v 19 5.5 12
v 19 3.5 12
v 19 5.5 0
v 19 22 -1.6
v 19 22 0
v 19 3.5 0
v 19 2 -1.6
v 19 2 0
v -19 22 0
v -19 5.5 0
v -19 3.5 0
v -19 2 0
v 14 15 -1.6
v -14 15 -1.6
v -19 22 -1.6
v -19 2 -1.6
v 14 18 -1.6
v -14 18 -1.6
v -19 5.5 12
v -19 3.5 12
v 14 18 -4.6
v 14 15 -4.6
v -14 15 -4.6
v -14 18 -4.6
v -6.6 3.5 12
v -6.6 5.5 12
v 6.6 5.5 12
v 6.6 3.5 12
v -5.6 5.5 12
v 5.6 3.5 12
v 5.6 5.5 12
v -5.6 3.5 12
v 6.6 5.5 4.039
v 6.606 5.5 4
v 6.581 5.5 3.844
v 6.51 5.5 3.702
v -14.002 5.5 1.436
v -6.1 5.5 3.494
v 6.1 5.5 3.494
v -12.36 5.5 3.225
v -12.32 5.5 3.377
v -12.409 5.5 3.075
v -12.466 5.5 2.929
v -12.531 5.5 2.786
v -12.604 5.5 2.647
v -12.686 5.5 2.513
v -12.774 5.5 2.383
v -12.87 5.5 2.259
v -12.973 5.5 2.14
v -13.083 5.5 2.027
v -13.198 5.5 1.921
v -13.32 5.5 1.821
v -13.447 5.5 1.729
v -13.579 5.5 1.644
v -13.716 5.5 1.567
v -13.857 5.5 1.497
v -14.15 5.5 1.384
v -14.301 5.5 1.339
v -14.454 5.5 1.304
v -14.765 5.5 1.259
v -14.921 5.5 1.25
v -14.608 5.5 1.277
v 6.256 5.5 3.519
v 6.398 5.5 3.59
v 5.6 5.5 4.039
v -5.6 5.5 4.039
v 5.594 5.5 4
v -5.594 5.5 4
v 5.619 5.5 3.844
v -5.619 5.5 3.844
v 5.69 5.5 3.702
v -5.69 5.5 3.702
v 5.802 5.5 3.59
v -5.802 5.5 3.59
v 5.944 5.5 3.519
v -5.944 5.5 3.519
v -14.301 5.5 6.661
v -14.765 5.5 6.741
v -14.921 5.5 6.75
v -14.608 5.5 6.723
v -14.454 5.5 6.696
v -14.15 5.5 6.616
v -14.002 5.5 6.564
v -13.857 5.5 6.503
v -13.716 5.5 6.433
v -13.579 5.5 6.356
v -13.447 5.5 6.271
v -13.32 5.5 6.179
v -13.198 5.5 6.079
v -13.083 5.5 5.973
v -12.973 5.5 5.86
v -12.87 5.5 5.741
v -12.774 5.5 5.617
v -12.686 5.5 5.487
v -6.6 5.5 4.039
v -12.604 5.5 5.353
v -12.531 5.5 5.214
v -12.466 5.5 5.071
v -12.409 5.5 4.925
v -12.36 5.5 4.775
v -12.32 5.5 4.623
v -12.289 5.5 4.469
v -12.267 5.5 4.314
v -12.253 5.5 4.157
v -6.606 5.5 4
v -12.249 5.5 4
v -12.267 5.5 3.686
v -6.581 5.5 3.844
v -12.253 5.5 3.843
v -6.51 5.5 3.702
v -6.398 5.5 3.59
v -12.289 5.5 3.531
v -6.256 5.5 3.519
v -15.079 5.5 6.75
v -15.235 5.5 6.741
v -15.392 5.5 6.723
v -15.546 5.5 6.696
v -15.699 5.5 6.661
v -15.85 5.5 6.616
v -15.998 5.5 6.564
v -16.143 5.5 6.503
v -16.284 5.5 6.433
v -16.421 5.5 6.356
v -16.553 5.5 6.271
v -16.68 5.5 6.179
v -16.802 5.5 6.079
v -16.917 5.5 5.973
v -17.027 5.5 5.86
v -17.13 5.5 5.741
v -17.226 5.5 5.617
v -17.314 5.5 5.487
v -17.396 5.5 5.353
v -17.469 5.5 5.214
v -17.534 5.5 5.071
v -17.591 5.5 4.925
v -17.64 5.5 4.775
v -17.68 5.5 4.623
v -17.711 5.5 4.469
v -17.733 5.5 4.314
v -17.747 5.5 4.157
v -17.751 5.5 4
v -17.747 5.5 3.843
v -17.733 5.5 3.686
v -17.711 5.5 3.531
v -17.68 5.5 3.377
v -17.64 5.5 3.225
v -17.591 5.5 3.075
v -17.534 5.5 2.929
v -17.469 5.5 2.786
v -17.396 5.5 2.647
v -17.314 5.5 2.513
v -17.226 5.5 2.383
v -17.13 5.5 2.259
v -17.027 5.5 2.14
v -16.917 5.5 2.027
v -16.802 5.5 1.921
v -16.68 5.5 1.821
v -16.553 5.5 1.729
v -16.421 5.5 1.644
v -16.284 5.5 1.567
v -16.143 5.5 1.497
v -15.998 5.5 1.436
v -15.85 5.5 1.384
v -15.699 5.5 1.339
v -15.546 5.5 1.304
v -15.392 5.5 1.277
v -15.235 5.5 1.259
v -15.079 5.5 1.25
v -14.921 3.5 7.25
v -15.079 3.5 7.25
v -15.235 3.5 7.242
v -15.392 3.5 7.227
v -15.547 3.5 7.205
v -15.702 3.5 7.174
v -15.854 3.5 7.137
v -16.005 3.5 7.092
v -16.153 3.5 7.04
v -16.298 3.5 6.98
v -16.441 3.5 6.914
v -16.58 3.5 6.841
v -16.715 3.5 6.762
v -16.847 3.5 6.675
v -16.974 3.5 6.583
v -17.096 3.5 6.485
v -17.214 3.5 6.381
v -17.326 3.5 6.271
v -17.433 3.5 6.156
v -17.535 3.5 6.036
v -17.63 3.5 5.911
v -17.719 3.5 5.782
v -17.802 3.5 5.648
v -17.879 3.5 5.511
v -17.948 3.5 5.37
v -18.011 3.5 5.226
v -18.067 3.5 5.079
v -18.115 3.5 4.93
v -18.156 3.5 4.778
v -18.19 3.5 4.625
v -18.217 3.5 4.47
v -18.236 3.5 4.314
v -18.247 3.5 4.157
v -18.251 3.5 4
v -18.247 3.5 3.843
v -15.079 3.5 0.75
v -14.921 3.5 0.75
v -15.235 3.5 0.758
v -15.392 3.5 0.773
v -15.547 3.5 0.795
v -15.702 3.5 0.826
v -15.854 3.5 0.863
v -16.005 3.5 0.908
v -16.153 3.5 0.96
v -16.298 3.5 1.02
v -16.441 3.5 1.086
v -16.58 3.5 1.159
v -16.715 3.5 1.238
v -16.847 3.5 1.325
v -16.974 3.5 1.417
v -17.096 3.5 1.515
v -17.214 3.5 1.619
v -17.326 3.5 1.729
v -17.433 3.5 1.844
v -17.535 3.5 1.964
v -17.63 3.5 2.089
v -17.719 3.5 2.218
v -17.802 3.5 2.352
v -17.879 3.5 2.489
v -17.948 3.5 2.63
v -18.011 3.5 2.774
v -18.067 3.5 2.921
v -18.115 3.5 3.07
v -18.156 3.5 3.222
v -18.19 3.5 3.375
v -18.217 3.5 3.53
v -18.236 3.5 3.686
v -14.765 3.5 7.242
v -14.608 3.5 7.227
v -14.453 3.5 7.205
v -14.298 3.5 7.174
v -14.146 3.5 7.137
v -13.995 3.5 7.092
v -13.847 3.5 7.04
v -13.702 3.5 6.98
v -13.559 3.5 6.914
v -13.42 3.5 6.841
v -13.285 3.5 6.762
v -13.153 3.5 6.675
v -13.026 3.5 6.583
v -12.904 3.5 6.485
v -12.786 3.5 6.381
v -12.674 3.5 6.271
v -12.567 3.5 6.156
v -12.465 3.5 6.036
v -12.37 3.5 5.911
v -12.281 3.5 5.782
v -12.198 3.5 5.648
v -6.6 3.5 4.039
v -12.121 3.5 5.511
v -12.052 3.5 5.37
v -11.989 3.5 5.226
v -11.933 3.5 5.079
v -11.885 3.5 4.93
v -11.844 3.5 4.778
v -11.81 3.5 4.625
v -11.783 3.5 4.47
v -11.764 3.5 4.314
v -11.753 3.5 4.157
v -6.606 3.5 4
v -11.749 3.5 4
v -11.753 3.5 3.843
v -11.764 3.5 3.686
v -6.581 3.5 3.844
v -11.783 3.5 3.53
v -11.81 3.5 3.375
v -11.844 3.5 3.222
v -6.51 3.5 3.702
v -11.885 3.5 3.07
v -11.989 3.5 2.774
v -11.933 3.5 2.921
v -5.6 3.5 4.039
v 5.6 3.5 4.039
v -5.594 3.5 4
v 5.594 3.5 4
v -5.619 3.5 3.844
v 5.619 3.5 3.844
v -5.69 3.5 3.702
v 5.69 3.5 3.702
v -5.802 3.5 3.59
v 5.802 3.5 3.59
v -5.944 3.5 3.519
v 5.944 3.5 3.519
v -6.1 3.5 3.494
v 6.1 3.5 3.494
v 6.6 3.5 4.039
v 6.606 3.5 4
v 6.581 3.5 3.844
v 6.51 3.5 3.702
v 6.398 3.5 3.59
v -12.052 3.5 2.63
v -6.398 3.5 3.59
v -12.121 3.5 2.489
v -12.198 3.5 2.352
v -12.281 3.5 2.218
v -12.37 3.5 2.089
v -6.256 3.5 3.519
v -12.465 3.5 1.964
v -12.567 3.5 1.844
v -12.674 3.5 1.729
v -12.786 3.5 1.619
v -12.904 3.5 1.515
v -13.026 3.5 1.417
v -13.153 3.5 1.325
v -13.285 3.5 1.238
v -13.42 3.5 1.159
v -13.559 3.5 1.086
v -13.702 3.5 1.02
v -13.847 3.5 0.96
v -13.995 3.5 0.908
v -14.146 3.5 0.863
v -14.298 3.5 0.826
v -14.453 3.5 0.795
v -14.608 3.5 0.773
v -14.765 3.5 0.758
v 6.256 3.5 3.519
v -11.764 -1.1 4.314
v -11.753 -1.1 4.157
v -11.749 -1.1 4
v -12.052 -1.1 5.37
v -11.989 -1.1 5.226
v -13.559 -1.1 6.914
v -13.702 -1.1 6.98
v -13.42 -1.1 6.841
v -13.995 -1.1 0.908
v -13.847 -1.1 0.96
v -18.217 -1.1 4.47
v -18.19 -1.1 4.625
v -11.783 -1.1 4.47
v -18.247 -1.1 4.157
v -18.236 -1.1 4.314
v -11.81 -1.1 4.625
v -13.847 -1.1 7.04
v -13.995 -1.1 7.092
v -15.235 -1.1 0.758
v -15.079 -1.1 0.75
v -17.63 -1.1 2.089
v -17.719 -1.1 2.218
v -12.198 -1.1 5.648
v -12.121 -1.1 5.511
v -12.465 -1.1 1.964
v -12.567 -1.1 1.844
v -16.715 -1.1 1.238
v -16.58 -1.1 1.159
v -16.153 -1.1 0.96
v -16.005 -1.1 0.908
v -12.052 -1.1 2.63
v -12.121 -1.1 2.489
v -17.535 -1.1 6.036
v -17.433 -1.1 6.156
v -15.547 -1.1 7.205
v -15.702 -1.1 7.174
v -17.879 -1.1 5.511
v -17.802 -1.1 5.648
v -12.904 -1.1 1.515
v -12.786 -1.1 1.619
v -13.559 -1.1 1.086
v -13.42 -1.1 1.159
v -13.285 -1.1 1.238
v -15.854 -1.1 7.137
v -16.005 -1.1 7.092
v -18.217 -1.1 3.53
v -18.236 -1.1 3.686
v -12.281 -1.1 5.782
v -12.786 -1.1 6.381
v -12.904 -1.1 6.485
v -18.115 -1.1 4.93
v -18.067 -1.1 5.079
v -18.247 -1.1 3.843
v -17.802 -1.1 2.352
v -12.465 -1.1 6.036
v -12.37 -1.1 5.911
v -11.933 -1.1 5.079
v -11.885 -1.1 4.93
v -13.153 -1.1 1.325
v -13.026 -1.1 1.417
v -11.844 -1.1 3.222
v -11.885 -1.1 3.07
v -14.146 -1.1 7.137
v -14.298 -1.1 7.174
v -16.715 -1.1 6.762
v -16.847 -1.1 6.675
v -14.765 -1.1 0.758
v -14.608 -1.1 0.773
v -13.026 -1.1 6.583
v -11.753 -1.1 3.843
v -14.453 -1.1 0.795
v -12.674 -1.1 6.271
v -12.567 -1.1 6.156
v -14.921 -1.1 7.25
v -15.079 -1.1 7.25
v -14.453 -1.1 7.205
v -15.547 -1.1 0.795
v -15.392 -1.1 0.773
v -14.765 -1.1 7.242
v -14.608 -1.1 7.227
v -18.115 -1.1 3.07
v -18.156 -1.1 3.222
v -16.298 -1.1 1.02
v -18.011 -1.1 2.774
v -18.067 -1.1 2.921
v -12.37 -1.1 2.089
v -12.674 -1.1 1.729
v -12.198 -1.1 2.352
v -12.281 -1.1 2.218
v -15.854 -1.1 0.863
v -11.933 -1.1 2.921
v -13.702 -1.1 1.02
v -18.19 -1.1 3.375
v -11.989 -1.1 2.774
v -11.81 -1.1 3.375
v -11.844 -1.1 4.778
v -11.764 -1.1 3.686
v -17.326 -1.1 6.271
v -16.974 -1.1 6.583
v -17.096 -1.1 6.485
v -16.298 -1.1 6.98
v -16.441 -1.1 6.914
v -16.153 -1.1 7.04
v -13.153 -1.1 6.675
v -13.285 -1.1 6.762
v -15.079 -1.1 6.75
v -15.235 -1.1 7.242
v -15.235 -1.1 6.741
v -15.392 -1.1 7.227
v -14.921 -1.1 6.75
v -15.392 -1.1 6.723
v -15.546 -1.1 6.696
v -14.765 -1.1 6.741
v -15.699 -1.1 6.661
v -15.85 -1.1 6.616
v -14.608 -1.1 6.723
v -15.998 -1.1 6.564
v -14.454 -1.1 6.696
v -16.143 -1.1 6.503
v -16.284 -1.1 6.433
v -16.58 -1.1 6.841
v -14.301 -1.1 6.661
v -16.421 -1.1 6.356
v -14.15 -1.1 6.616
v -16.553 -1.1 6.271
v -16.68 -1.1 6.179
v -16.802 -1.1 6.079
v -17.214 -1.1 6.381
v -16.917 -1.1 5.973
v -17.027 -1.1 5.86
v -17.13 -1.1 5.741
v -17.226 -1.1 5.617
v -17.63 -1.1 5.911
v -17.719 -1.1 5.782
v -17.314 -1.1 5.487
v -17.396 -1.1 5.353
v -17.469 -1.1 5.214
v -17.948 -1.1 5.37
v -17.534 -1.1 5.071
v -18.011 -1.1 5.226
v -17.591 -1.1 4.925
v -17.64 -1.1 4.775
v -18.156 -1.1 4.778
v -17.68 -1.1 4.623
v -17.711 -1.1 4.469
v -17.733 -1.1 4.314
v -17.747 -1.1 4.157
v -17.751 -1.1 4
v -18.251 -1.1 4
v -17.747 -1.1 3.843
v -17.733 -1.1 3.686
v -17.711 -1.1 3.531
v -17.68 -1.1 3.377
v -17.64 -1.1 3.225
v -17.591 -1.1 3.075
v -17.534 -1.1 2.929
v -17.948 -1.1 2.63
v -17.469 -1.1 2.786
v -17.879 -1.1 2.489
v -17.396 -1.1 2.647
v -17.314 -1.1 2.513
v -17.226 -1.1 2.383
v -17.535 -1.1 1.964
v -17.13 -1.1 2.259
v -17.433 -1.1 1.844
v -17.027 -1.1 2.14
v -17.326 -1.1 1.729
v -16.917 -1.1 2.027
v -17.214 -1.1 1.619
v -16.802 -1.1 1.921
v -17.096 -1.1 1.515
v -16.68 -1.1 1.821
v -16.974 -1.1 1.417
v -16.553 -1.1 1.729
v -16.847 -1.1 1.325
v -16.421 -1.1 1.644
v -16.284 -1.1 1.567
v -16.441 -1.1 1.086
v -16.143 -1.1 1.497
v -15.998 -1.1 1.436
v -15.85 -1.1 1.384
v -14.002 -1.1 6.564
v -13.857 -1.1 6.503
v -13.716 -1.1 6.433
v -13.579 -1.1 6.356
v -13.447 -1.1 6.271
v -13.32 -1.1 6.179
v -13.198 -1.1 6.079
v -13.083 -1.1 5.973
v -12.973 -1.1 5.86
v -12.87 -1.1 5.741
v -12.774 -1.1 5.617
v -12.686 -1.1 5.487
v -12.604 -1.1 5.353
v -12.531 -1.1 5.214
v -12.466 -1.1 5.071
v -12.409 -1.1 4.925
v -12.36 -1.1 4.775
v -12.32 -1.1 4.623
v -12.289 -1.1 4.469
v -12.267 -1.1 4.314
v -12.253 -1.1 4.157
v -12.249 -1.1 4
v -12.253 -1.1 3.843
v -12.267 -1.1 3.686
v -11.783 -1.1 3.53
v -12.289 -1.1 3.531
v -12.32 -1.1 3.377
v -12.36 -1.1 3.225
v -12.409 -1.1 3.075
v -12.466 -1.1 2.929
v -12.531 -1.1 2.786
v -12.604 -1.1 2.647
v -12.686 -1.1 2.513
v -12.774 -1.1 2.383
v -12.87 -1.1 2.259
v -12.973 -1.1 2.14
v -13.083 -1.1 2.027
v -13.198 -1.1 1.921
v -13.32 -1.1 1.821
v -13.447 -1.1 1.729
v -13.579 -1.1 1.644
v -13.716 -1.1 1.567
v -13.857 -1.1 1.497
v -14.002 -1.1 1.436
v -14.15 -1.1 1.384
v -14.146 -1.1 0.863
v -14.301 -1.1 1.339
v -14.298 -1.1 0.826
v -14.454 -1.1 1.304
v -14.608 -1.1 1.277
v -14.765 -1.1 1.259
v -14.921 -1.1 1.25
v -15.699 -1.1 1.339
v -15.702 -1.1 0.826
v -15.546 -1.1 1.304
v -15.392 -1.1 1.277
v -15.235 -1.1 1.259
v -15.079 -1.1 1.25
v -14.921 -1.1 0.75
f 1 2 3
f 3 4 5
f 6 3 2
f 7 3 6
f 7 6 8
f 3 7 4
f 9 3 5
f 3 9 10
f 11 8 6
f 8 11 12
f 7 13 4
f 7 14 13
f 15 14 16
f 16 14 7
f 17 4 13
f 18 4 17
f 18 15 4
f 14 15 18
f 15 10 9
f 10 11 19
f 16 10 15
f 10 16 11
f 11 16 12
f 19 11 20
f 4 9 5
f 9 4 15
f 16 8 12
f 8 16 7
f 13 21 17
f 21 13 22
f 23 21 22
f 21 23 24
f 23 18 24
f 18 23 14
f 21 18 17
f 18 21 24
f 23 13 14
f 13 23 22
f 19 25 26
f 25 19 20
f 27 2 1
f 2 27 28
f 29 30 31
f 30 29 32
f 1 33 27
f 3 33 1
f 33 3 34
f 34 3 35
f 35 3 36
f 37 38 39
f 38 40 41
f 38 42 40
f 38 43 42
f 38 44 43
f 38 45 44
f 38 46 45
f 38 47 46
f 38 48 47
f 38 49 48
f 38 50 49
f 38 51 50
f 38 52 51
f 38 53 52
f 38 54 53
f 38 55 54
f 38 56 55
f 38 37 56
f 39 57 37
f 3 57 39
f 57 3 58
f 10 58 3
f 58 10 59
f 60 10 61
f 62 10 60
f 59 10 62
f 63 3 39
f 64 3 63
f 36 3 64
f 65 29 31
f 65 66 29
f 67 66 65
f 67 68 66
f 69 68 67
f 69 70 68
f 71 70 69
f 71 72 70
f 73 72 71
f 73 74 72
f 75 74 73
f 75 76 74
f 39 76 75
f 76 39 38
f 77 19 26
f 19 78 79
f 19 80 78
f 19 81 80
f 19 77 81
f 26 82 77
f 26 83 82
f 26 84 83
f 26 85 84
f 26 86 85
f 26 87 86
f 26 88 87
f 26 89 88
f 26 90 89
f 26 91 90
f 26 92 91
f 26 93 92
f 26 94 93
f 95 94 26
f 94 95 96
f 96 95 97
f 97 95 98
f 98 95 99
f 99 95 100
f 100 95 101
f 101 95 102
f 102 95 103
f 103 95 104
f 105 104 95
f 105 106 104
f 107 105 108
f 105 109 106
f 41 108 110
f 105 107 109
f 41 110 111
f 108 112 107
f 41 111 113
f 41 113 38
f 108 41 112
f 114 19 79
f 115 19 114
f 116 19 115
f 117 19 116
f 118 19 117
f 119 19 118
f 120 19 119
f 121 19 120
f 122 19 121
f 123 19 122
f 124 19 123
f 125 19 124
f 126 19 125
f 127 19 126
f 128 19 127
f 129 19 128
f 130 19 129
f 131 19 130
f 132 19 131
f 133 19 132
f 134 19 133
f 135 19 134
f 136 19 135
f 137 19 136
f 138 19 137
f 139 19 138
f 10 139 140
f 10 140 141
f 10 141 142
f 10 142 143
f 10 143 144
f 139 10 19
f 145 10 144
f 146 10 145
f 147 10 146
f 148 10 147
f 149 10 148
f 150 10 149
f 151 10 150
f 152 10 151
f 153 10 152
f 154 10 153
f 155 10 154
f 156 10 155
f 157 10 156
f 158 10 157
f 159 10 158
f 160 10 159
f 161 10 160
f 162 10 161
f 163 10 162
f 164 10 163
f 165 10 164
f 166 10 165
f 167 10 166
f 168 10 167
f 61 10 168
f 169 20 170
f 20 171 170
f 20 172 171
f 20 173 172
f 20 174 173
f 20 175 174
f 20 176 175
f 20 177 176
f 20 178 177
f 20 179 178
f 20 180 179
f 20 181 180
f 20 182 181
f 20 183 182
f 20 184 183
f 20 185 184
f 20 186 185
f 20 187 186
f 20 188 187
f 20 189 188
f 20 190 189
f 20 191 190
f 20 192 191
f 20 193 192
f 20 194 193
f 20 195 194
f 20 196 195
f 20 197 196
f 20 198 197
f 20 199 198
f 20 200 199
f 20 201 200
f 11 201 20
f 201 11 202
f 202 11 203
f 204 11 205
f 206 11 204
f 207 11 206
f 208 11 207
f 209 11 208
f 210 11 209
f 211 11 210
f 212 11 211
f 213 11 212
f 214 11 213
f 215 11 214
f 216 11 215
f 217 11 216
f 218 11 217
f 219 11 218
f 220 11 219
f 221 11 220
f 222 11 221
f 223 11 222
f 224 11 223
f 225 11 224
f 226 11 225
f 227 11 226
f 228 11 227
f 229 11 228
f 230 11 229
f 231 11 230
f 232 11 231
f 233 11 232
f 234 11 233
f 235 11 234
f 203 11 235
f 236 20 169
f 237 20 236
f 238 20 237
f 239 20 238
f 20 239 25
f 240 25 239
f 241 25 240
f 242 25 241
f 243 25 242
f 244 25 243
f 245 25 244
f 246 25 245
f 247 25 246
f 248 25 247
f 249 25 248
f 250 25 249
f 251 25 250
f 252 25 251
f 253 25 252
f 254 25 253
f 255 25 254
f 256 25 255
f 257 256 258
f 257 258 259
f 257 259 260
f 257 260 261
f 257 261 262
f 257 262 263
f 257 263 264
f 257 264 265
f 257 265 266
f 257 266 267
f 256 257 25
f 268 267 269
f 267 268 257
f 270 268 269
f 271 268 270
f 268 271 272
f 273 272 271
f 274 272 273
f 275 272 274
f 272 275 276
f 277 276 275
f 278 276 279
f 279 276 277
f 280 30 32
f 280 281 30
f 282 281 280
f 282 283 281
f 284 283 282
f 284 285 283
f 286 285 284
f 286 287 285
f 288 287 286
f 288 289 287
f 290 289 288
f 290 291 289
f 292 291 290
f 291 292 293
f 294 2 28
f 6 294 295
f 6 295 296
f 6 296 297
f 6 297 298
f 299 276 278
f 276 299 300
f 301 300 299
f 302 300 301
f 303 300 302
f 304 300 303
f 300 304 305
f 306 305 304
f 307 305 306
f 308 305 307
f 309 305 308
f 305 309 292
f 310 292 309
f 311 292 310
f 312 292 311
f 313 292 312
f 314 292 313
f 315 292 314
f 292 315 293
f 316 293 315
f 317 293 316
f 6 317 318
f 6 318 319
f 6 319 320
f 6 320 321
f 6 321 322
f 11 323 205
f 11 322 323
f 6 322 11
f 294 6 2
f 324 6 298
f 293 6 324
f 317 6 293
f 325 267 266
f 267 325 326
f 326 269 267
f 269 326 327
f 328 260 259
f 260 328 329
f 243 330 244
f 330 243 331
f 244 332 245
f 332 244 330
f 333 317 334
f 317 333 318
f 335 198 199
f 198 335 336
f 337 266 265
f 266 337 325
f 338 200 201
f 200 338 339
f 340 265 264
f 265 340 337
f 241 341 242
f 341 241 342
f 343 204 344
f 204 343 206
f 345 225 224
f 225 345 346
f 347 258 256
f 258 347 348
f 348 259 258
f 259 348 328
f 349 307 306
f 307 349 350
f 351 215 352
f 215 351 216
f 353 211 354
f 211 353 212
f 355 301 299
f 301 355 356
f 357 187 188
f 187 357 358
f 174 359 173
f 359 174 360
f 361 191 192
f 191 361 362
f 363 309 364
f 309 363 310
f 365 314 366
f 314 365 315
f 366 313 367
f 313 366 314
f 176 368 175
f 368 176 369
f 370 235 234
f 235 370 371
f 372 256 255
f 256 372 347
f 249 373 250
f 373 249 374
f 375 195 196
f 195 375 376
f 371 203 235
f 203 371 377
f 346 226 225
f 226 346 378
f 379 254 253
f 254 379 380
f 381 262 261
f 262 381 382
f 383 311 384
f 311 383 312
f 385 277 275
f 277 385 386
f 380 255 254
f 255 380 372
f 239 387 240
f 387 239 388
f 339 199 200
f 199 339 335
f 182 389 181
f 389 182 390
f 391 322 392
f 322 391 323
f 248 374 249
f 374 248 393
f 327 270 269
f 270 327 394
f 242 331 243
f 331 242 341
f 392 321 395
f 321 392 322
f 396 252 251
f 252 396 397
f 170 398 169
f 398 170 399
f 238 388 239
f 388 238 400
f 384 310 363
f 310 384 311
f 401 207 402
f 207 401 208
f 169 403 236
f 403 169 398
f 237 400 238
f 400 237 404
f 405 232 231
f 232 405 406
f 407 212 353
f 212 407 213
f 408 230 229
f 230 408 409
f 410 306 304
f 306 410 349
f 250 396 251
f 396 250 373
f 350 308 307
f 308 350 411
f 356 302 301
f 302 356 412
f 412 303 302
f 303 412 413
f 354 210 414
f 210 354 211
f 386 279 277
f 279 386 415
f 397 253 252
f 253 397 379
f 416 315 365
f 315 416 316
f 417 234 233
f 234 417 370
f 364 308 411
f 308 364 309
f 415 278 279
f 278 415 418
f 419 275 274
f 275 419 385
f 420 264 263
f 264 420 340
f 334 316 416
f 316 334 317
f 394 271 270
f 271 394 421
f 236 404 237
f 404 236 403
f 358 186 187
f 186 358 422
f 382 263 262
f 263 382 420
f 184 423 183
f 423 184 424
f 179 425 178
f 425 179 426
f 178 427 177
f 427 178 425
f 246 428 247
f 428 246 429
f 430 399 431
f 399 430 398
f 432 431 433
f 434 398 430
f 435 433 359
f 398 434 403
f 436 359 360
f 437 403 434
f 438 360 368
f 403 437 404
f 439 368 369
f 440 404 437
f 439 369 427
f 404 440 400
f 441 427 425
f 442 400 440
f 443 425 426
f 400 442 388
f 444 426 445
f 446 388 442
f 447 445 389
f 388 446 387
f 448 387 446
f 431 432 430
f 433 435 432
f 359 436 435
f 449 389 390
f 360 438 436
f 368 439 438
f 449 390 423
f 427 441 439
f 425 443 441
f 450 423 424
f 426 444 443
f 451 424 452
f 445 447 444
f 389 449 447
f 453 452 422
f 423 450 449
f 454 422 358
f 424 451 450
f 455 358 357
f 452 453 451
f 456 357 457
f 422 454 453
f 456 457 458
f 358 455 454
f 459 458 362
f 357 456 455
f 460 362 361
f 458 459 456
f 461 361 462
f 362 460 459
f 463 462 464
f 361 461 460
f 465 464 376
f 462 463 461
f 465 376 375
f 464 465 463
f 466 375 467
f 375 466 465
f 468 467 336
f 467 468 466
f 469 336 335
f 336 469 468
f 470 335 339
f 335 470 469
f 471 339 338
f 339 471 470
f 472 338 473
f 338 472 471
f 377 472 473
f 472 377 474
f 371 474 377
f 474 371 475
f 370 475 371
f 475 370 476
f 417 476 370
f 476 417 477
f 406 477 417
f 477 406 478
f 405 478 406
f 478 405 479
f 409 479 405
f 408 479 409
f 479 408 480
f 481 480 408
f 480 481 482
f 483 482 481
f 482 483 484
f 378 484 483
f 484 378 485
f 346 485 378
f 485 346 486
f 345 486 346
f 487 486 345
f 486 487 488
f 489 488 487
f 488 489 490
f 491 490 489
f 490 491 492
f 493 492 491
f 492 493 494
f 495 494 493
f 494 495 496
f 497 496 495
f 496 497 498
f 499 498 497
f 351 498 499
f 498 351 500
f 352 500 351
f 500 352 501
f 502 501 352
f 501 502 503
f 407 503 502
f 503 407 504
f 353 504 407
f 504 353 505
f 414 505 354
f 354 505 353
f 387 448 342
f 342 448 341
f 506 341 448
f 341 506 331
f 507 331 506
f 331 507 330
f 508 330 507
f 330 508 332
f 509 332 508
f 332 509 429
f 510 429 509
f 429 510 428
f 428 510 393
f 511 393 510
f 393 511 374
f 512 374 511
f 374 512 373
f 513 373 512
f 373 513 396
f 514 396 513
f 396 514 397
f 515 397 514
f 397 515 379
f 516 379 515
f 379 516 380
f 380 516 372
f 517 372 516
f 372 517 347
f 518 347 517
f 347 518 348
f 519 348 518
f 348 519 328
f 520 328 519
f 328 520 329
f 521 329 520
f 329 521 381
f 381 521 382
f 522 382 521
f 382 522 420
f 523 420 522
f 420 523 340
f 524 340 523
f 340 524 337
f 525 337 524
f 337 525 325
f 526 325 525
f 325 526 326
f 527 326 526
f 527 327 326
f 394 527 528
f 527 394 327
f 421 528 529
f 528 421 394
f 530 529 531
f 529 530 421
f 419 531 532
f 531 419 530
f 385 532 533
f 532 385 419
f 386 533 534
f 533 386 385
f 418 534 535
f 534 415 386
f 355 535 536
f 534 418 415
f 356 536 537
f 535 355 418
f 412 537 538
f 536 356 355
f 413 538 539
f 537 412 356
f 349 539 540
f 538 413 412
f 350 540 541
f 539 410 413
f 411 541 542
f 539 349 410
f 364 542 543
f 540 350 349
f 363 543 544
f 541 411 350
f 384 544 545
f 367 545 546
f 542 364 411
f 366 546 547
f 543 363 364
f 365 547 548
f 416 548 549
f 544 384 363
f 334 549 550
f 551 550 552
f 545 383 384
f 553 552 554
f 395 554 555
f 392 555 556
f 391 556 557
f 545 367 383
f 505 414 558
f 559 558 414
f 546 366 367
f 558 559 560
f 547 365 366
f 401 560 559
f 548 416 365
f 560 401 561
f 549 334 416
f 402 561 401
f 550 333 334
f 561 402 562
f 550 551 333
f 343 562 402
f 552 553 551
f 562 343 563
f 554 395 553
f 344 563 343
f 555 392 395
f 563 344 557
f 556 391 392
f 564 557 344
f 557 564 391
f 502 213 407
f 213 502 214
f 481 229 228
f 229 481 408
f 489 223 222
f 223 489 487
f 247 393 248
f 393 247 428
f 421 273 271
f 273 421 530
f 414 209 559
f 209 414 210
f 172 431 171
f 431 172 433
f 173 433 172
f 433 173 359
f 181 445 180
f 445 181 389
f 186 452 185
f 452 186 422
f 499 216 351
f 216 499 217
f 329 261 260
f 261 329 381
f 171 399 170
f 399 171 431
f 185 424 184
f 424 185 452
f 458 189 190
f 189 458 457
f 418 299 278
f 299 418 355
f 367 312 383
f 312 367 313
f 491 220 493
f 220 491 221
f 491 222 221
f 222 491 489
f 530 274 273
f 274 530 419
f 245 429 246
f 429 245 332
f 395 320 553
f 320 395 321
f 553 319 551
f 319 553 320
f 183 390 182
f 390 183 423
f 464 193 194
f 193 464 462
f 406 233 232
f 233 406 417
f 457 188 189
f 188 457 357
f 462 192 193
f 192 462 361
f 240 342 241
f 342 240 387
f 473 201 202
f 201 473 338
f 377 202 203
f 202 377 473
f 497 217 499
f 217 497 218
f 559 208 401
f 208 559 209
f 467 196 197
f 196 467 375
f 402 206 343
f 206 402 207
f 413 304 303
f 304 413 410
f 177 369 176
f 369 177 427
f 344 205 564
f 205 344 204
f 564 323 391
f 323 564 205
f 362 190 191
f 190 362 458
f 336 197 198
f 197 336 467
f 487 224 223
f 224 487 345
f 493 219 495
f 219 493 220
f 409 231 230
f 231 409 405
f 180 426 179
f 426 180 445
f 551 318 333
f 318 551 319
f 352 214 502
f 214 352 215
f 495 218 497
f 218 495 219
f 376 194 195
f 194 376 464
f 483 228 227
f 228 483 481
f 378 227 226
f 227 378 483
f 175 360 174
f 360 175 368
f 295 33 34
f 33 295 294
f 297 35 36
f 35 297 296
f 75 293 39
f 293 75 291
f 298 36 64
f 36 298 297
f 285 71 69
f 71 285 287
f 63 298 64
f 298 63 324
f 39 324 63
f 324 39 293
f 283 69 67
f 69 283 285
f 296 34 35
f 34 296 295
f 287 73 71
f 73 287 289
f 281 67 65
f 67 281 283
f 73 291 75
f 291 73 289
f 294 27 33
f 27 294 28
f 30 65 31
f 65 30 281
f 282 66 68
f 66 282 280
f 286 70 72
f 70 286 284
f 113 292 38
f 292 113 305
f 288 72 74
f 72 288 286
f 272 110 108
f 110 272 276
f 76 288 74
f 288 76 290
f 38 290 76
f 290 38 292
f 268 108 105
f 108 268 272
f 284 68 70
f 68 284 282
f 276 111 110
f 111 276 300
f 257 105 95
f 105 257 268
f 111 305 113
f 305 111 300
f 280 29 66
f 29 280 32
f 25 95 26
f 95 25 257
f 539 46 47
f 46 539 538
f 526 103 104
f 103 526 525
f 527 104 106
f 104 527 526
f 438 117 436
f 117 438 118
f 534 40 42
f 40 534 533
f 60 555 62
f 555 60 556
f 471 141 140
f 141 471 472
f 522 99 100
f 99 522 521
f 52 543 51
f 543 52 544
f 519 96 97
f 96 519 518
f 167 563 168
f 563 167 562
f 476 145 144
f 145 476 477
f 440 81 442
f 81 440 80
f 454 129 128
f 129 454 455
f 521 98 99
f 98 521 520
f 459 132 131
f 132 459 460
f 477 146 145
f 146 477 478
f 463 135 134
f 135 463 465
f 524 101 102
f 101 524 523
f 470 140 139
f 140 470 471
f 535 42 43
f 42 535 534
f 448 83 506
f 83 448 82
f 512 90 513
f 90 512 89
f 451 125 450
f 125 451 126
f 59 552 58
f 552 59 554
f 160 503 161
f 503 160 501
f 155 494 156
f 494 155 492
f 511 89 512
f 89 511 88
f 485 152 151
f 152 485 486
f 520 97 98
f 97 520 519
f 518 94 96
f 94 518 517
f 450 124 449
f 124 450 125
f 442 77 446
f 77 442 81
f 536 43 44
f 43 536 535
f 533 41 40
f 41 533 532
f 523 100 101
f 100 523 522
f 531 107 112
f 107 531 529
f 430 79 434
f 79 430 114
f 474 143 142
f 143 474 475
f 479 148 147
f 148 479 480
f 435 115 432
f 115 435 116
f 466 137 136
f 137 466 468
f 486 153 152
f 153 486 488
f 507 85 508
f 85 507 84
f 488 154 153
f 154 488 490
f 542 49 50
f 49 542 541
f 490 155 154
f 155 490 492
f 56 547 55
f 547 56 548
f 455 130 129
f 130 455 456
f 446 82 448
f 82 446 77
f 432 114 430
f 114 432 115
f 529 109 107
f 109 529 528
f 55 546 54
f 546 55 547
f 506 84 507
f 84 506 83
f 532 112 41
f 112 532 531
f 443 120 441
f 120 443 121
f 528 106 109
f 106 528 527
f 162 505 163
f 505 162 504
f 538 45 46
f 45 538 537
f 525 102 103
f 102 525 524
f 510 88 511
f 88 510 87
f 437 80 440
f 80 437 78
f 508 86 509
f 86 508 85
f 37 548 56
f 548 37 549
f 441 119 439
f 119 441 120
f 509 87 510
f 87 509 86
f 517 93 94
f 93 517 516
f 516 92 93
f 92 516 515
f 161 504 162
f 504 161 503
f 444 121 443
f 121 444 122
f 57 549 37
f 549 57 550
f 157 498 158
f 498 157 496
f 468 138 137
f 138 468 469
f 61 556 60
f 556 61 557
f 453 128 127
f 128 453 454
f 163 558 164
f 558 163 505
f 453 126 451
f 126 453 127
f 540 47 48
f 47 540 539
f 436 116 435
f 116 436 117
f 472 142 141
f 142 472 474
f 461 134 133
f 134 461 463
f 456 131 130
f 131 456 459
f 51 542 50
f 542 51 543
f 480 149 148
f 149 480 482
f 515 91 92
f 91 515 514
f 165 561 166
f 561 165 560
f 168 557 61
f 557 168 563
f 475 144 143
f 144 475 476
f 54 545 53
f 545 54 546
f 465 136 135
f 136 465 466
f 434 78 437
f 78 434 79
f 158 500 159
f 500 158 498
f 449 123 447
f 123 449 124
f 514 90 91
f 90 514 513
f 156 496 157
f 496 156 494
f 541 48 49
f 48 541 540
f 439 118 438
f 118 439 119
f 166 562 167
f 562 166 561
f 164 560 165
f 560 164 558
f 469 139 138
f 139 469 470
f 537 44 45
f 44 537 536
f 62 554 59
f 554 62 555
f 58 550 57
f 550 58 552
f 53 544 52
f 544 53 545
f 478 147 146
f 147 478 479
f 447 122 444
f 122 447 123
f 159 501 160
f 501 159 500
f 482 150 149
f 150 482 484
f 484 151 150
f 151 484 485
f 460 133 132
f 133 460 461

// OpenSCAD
/* Permet de contruire un support pour les bouttons du boitier NES
By jeff le 10/2017
*/

//-------------------Declaration des variables

/* [Basic] */
//Buttons's depth (in mm)
_depth_button = 6; //[6:0.5:15]
//Buttons 's diameter (in mm)
_diameter_button = 1; //[1:0.5:8]

/* [LED] */
//Diameter LED (in mm)
_diameter_led = 5; //[3,5]
//LED's hat (Remove losing lighting in the case)
_led_hat = "yes"; //[yes,no]

/* [hidden] */
_epaisseur = 1.6;
_epaisseur_patte = 2;
_largeur = 38;
_hauteur_base_axe = 4;
_ajustement = 2.5;

//-------------------!Déclaration des variables





//-------------------Contruction de la forme

//Base fixe
base();

//Plaque variable
translate([0,_depth_button-_ajustement,0]){
	reglage(0);
}

//-------------------!Contruction de la forme






//Base horizontale
module base(){
	translate([-_largeur/2,2,-_epaisseur]){
		cube(size = [_largeur,20,_epaisseur], center = false);
	}	
	//Patte d'arret
	translate([-28/2,15,-3-_epaisseur]){
		cube(size = [28,3,3], center = false);
	}
}//!module base

//Module de plaque percée
module reglage(_profondeur){

difference(){ //Soustraction de la base avec les trous des bouttons

	
	union(){
		//Patte verticale
		translate([-_largeur/2,_profondeur,0]){
			cube(size = [_largeur,_epaisseur_patte,12], center = false);
		};
		
		//Chapeau LED
		if(_led_hat == "yes"){
		
			translate([-15,-_epaisseur,_hauteur_base_axe]){
				rotate([90,0,0]){
					*cylinder(h=_epaisseur*2,r1=(_diameter_led/2),r2=(_diameter_led/2),center=true);
					polyhole(6,_diameter_led+1.5);
				}
			};
			
		}//!if
	
	}
	;
	
	




	//Trous a droite
	translate([6.1,1,_hauteur_base_axe]){
		trou_bouton(_diameter_button);
	}

	//Trous a gauche
	translate([-6.1,1,_hauteur_base_axe]){
		trou_bouton(_diameter_button);
	}

	//Trous LED
	translate([-15,1,_hauteur_base_axe]){
		rotate([90,0,0]){
			polyhole(_epaisseur*100,_diameter_led+0.5);
		}
	}

};


}//!Module reglage

//Module de trou des bouttons
module trou_bouton(_diametre){

	rotate([90,0,0]){
		*cylinder(h=_epaisseur*2,r=(_diametre/2),center=true);
		polyhole(_epaisseur*2,_diametre);
		translate([0,20/2,0]){
			cube(size = [_diametre,20,_epaisseur*2], center = true);
		}
		
	}//!rotate

}//!trou_bouton

//Module de trou
module polyhole(_h, _d) {
    _n = max(round(20 * _d),3);
    cylinder(h = _h, r = (_d / 2) / cos (180 / _n), $fn = _n,center = true);
}//!Module de trou


//Module de trou
module polyhole2(_h, _d1,_d2) {
    _n = max(round(20 * _d1),3);
    cylinder(h = _h, r1 = (_d1 / 2) / cos (180 / _n),r2 = (_d2 / 2) / cos (180 / _n), $fn = _n,center = true);
}//!Module de trou


	
